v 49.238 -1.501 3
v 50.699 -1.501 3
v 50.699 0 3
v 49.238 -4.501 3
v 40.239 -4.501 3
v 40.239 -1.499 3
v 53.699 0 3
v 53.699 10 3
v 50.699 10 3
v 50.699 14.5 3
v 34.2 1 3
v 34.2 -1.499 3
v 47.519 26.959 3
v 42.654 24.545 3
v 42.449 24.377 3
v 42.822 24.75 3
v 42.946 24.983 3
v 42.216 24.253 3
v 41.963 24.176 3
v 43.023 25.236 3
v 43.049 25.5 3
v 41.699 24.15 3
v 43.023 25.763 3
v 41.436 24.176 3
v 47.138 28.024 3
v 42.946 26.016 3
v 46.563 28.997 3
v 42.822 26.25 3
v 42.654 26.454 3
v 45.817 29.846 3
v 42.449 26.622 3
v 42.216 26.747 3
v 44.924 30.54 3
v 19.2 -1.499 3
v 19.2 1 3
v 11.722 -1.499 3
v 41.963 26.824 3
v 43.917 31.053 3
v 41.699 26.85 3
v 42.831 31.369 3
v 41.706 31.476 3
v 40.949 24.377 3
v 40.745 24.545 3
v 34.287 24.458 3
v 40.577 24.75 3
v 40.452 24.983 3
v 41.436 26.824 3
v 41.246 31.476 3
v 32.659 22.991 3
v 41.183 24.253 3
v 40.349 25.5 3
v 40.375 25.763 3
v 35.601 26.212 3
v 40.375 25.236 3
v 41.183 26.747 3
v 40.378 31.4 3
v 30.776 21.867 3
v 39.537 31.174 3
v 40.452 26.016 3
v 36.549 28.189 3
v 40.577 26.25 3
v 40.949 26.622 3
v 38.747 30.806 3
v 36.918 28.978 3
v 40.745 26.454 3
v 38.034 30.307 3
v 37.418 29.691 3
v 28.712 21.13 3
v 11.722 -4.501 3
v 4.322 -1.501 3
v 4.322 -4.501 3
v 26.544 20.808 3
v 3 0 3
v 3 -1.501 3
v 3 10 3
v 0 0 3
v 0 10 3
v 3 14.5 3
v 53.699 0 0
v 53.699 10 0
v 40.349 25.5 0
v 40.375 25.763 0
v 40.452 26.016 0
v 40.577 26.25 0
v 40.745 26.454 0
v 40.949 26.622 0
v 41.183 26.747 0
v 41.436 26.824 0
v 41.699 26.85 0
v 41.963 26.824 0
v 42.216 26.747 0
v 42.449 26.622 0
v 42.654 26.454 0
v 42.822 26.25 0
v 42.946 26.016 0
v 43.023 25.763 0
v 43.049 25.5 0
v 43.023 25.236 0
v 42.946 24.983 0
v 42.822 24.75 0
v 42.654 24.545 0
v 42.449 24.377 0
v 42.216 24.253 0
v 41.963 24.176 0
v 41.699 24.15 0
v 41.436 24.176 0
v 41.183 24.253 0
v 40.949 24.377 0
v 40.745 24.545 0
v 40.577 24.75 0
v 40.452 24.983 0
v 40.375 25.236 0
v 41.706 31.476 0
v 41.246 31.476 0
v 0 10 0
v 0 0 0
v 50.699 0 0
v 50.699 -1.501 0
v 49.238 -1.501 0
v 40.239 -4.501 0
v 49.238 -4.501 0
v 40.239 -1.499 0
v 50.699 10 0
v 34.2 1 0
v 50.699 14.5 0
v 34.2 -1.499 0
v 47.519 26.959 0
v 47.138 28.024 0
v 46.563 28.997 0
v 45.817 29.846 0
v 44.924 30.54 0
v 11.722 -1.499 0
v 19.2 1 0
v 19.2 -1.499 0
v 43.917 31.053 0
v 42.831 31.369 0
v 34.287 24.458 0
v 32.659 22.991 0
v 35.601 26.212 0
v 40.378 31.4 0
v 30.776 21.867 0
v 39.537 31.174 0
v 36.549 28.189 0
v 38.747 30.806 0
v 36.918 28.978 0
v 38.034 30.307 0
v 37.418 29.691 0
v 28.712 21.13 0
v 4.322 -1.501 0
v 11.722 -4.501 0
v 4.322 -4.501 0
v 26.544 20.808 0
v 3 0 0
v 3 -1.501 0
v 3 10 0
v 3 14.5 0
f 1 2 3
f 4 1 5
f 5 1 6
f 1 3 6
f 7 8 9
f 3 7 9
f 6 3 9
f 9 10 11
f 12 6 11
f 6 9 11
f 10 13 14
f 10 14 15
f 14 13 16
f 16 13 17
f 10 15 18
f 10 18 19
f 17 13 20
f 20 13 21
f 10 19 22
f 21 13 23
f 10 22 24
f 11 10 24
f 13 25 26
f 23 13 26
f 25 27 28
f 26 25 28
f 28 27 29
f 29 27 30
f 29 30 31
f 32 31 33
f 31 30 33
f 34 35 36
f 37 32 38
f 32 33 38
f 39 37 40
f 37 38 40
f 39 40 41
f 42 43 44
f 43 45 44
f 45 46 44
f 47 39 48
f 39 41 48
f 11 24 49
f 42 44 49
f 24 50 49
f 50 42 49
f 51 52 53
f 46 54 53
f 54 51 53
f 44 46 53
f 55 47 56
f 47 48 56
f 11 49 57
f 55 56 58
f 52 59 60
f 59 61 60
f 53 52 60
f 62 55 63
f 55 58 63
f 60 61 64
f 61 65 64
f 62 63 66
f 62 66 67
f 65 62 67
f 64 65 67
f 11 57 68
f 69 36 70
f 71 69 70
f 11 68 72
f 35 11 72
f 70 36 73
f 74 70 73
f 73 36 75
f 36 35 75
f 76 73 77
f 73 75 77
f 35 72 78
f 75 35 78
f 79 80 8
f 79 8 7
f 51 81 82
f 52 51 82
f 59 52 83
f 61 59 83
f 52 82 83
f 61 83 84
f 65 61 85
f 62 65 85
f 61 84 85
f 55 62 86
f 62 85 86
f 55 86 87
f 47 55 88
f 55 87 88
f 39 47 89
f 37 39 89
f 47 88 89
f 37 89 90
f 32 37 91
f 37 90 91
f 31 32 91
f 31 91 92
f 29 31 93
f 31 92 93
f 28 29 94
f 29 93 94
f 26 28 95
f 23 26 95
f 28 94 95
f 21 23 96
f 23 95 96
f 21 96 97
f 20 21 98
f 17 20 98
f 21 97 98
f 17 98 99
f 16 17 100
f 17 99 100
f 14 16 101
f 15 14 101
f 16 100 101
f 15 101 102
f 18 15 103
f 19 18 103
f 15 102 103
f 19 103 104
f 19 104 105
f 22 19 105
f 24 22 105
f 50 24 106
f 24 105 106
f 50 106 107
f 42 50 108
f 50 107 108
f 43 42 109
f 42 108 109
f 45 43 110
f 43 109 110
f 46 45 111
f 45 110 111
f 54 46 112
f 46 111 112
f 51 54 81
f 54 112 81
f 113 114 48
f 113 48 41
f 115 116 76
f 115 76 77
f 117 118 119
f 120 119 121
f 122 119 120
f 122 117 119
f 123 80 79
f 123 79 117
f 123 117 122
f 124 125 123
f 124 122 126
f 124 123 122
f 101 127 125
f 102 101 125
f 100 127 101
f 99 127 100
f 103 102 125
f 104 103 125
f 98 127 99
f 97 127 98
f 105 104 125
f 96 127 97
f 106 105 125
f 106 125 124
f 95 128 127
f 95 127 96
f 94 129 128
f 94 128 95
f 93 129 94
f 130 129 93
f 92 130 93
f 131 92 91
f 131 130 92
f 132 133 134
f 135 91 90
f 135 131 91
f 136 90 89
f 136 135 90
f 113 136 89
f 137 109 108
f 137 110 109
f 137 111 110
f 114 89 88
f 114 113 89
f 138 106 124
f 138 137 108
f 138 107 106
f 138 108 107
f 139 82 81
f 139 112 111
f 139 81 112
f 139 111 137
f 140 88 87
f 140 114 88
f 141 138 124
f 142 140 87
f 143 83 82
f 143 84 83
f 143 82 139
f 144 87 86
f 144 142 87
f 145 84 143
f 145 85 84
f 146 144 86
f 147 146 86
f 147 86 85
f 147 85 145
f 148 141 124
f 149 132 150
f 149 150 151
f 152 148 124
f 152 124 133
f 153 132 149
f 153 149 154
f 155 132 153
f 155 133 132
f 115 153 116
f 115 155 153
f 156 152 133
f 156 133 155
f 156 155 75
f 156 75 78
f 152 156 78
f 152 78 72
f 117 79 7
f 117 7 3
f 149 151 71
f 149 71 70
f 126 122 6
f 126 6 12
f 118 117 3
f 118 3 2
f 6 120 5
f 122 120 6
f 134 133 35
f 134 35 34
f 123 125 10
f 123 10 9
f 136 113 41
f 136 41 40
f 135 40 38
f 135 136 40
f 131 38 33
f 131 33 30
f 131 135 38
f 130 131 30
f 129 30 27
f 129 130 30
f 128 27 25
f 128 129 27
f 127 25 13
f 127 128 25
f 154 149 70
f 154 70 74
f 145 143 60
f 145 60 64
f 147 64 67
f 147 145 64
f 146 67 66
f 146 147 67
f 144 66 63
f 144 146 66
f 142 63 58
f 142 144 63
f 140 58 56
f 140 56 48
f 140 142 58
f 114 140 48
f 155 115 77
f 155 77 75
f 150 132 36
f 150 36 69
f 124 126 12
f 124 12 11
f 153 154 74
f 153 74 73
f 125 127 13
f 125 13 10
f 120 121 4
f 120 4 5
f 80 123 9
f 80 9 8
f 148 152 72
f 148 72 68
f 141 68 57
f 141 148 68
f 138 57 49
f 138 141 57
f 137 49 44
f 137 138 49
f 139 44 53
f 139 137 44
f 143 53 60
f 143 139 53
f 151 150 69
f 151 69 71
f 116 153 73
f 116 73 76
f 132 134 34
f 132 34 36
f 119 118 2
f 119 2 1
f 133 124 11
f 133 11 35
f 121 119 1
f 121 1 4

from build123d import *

# Parameters (mm, degrees)
SKETCH_1_R      = 1.35
EXTRUDE_1_DEPTH = 3


with BuildPart() as part:
    # 草图1 → 凸台-拉伸1 (new body)
    with BuildSketch(Plane(origin=(0, 0, 0), x_dir=(-1, 0, 0), z_dir=(0, 0, -1))):
        with BuildLine():
            Line((-41.246222879, 31.4756), (-41.70566582, 31.4756))
            ThreePointArc((-41.70566582, 31.4756), (-45.386541118, 30.213865193), (-47.519320255, 26.959319012))
            Line((-47.519320255, 26.959319012), (-50.6992, 14.4996))
            Line((-50.6992, 14.4996), (-50.6992, 10.0003))
            Line((-50.6992, 10.0003), (-53.6992, 10.0003))
            Line((-53.6992, 10.0003), (-53.6992, 0))
            Line((-53.6992, 0), (-50.6992, 0))
            Line((-50.6992, 0), (-50.6992, -1.5007))
            Line((-50.6992, -1.5007), (-49.2382, -1.5007))
            Line((-49.2382, -1.5007), (-49.2382, -4.5007))
            Line((-49.2382, -4.5007), (-40.2392, -4.5007))
            Line((-40.2392, -4.5007), (-40.2392, -1.4993))
            Line((-40.2392, -1.4993), (-34.2002, -1.4993))
            Line((-34.2002, -1.4993), (-34.2002, 1.0005))
            Line((-34.2002, 1.0005), (-19.2003, 1.0005))
            Line((-19.2003, 1.0005), (-19.2003, -1.4993))
            Line((-19.2003, -1.4993), (-11.7217, -1.4993))
            Line((-11.7217, -1.4993), (-11.7217, -4.5007))
            Line((-11.7217, -4.5007), (-4.3215, -4.5007))
            Line((-4.3215, -4.5007), (-4.3215, -1.5007))
            Line((-4.3215, -1.5007), (-3, -1.5007))
            Line((-3, -1.5007), (-3, 0))
            Line((-3, 0), (0, 0))
            Line((0, 0), (0, 10.0003))
            Line((0, 10.0003), (-3, 10.0003))
            Line((-3, 10.0003), (-3, 14.4996))
            Line((-3, 14.4996), (-26.543543046, 20.807804388))
            ThreePointArc((-26.543543046, 20.807804388), (-32.65852857, 22.990550509), (-36.548909006, 28.188854909))
            ThreePointArc((-36.548909006, 28.188854909), (-38.379715818, 30.572322748), (-41.246222879, 31.4756))
        make_face()
        with Locations((-41.6992, 25.49975)):
            Circle(SKETCH_1_R, mode=Mode.SUBTRACT)
    extrude(amount=-EXTRUDE_1_DEPTH)


solid = part.part
